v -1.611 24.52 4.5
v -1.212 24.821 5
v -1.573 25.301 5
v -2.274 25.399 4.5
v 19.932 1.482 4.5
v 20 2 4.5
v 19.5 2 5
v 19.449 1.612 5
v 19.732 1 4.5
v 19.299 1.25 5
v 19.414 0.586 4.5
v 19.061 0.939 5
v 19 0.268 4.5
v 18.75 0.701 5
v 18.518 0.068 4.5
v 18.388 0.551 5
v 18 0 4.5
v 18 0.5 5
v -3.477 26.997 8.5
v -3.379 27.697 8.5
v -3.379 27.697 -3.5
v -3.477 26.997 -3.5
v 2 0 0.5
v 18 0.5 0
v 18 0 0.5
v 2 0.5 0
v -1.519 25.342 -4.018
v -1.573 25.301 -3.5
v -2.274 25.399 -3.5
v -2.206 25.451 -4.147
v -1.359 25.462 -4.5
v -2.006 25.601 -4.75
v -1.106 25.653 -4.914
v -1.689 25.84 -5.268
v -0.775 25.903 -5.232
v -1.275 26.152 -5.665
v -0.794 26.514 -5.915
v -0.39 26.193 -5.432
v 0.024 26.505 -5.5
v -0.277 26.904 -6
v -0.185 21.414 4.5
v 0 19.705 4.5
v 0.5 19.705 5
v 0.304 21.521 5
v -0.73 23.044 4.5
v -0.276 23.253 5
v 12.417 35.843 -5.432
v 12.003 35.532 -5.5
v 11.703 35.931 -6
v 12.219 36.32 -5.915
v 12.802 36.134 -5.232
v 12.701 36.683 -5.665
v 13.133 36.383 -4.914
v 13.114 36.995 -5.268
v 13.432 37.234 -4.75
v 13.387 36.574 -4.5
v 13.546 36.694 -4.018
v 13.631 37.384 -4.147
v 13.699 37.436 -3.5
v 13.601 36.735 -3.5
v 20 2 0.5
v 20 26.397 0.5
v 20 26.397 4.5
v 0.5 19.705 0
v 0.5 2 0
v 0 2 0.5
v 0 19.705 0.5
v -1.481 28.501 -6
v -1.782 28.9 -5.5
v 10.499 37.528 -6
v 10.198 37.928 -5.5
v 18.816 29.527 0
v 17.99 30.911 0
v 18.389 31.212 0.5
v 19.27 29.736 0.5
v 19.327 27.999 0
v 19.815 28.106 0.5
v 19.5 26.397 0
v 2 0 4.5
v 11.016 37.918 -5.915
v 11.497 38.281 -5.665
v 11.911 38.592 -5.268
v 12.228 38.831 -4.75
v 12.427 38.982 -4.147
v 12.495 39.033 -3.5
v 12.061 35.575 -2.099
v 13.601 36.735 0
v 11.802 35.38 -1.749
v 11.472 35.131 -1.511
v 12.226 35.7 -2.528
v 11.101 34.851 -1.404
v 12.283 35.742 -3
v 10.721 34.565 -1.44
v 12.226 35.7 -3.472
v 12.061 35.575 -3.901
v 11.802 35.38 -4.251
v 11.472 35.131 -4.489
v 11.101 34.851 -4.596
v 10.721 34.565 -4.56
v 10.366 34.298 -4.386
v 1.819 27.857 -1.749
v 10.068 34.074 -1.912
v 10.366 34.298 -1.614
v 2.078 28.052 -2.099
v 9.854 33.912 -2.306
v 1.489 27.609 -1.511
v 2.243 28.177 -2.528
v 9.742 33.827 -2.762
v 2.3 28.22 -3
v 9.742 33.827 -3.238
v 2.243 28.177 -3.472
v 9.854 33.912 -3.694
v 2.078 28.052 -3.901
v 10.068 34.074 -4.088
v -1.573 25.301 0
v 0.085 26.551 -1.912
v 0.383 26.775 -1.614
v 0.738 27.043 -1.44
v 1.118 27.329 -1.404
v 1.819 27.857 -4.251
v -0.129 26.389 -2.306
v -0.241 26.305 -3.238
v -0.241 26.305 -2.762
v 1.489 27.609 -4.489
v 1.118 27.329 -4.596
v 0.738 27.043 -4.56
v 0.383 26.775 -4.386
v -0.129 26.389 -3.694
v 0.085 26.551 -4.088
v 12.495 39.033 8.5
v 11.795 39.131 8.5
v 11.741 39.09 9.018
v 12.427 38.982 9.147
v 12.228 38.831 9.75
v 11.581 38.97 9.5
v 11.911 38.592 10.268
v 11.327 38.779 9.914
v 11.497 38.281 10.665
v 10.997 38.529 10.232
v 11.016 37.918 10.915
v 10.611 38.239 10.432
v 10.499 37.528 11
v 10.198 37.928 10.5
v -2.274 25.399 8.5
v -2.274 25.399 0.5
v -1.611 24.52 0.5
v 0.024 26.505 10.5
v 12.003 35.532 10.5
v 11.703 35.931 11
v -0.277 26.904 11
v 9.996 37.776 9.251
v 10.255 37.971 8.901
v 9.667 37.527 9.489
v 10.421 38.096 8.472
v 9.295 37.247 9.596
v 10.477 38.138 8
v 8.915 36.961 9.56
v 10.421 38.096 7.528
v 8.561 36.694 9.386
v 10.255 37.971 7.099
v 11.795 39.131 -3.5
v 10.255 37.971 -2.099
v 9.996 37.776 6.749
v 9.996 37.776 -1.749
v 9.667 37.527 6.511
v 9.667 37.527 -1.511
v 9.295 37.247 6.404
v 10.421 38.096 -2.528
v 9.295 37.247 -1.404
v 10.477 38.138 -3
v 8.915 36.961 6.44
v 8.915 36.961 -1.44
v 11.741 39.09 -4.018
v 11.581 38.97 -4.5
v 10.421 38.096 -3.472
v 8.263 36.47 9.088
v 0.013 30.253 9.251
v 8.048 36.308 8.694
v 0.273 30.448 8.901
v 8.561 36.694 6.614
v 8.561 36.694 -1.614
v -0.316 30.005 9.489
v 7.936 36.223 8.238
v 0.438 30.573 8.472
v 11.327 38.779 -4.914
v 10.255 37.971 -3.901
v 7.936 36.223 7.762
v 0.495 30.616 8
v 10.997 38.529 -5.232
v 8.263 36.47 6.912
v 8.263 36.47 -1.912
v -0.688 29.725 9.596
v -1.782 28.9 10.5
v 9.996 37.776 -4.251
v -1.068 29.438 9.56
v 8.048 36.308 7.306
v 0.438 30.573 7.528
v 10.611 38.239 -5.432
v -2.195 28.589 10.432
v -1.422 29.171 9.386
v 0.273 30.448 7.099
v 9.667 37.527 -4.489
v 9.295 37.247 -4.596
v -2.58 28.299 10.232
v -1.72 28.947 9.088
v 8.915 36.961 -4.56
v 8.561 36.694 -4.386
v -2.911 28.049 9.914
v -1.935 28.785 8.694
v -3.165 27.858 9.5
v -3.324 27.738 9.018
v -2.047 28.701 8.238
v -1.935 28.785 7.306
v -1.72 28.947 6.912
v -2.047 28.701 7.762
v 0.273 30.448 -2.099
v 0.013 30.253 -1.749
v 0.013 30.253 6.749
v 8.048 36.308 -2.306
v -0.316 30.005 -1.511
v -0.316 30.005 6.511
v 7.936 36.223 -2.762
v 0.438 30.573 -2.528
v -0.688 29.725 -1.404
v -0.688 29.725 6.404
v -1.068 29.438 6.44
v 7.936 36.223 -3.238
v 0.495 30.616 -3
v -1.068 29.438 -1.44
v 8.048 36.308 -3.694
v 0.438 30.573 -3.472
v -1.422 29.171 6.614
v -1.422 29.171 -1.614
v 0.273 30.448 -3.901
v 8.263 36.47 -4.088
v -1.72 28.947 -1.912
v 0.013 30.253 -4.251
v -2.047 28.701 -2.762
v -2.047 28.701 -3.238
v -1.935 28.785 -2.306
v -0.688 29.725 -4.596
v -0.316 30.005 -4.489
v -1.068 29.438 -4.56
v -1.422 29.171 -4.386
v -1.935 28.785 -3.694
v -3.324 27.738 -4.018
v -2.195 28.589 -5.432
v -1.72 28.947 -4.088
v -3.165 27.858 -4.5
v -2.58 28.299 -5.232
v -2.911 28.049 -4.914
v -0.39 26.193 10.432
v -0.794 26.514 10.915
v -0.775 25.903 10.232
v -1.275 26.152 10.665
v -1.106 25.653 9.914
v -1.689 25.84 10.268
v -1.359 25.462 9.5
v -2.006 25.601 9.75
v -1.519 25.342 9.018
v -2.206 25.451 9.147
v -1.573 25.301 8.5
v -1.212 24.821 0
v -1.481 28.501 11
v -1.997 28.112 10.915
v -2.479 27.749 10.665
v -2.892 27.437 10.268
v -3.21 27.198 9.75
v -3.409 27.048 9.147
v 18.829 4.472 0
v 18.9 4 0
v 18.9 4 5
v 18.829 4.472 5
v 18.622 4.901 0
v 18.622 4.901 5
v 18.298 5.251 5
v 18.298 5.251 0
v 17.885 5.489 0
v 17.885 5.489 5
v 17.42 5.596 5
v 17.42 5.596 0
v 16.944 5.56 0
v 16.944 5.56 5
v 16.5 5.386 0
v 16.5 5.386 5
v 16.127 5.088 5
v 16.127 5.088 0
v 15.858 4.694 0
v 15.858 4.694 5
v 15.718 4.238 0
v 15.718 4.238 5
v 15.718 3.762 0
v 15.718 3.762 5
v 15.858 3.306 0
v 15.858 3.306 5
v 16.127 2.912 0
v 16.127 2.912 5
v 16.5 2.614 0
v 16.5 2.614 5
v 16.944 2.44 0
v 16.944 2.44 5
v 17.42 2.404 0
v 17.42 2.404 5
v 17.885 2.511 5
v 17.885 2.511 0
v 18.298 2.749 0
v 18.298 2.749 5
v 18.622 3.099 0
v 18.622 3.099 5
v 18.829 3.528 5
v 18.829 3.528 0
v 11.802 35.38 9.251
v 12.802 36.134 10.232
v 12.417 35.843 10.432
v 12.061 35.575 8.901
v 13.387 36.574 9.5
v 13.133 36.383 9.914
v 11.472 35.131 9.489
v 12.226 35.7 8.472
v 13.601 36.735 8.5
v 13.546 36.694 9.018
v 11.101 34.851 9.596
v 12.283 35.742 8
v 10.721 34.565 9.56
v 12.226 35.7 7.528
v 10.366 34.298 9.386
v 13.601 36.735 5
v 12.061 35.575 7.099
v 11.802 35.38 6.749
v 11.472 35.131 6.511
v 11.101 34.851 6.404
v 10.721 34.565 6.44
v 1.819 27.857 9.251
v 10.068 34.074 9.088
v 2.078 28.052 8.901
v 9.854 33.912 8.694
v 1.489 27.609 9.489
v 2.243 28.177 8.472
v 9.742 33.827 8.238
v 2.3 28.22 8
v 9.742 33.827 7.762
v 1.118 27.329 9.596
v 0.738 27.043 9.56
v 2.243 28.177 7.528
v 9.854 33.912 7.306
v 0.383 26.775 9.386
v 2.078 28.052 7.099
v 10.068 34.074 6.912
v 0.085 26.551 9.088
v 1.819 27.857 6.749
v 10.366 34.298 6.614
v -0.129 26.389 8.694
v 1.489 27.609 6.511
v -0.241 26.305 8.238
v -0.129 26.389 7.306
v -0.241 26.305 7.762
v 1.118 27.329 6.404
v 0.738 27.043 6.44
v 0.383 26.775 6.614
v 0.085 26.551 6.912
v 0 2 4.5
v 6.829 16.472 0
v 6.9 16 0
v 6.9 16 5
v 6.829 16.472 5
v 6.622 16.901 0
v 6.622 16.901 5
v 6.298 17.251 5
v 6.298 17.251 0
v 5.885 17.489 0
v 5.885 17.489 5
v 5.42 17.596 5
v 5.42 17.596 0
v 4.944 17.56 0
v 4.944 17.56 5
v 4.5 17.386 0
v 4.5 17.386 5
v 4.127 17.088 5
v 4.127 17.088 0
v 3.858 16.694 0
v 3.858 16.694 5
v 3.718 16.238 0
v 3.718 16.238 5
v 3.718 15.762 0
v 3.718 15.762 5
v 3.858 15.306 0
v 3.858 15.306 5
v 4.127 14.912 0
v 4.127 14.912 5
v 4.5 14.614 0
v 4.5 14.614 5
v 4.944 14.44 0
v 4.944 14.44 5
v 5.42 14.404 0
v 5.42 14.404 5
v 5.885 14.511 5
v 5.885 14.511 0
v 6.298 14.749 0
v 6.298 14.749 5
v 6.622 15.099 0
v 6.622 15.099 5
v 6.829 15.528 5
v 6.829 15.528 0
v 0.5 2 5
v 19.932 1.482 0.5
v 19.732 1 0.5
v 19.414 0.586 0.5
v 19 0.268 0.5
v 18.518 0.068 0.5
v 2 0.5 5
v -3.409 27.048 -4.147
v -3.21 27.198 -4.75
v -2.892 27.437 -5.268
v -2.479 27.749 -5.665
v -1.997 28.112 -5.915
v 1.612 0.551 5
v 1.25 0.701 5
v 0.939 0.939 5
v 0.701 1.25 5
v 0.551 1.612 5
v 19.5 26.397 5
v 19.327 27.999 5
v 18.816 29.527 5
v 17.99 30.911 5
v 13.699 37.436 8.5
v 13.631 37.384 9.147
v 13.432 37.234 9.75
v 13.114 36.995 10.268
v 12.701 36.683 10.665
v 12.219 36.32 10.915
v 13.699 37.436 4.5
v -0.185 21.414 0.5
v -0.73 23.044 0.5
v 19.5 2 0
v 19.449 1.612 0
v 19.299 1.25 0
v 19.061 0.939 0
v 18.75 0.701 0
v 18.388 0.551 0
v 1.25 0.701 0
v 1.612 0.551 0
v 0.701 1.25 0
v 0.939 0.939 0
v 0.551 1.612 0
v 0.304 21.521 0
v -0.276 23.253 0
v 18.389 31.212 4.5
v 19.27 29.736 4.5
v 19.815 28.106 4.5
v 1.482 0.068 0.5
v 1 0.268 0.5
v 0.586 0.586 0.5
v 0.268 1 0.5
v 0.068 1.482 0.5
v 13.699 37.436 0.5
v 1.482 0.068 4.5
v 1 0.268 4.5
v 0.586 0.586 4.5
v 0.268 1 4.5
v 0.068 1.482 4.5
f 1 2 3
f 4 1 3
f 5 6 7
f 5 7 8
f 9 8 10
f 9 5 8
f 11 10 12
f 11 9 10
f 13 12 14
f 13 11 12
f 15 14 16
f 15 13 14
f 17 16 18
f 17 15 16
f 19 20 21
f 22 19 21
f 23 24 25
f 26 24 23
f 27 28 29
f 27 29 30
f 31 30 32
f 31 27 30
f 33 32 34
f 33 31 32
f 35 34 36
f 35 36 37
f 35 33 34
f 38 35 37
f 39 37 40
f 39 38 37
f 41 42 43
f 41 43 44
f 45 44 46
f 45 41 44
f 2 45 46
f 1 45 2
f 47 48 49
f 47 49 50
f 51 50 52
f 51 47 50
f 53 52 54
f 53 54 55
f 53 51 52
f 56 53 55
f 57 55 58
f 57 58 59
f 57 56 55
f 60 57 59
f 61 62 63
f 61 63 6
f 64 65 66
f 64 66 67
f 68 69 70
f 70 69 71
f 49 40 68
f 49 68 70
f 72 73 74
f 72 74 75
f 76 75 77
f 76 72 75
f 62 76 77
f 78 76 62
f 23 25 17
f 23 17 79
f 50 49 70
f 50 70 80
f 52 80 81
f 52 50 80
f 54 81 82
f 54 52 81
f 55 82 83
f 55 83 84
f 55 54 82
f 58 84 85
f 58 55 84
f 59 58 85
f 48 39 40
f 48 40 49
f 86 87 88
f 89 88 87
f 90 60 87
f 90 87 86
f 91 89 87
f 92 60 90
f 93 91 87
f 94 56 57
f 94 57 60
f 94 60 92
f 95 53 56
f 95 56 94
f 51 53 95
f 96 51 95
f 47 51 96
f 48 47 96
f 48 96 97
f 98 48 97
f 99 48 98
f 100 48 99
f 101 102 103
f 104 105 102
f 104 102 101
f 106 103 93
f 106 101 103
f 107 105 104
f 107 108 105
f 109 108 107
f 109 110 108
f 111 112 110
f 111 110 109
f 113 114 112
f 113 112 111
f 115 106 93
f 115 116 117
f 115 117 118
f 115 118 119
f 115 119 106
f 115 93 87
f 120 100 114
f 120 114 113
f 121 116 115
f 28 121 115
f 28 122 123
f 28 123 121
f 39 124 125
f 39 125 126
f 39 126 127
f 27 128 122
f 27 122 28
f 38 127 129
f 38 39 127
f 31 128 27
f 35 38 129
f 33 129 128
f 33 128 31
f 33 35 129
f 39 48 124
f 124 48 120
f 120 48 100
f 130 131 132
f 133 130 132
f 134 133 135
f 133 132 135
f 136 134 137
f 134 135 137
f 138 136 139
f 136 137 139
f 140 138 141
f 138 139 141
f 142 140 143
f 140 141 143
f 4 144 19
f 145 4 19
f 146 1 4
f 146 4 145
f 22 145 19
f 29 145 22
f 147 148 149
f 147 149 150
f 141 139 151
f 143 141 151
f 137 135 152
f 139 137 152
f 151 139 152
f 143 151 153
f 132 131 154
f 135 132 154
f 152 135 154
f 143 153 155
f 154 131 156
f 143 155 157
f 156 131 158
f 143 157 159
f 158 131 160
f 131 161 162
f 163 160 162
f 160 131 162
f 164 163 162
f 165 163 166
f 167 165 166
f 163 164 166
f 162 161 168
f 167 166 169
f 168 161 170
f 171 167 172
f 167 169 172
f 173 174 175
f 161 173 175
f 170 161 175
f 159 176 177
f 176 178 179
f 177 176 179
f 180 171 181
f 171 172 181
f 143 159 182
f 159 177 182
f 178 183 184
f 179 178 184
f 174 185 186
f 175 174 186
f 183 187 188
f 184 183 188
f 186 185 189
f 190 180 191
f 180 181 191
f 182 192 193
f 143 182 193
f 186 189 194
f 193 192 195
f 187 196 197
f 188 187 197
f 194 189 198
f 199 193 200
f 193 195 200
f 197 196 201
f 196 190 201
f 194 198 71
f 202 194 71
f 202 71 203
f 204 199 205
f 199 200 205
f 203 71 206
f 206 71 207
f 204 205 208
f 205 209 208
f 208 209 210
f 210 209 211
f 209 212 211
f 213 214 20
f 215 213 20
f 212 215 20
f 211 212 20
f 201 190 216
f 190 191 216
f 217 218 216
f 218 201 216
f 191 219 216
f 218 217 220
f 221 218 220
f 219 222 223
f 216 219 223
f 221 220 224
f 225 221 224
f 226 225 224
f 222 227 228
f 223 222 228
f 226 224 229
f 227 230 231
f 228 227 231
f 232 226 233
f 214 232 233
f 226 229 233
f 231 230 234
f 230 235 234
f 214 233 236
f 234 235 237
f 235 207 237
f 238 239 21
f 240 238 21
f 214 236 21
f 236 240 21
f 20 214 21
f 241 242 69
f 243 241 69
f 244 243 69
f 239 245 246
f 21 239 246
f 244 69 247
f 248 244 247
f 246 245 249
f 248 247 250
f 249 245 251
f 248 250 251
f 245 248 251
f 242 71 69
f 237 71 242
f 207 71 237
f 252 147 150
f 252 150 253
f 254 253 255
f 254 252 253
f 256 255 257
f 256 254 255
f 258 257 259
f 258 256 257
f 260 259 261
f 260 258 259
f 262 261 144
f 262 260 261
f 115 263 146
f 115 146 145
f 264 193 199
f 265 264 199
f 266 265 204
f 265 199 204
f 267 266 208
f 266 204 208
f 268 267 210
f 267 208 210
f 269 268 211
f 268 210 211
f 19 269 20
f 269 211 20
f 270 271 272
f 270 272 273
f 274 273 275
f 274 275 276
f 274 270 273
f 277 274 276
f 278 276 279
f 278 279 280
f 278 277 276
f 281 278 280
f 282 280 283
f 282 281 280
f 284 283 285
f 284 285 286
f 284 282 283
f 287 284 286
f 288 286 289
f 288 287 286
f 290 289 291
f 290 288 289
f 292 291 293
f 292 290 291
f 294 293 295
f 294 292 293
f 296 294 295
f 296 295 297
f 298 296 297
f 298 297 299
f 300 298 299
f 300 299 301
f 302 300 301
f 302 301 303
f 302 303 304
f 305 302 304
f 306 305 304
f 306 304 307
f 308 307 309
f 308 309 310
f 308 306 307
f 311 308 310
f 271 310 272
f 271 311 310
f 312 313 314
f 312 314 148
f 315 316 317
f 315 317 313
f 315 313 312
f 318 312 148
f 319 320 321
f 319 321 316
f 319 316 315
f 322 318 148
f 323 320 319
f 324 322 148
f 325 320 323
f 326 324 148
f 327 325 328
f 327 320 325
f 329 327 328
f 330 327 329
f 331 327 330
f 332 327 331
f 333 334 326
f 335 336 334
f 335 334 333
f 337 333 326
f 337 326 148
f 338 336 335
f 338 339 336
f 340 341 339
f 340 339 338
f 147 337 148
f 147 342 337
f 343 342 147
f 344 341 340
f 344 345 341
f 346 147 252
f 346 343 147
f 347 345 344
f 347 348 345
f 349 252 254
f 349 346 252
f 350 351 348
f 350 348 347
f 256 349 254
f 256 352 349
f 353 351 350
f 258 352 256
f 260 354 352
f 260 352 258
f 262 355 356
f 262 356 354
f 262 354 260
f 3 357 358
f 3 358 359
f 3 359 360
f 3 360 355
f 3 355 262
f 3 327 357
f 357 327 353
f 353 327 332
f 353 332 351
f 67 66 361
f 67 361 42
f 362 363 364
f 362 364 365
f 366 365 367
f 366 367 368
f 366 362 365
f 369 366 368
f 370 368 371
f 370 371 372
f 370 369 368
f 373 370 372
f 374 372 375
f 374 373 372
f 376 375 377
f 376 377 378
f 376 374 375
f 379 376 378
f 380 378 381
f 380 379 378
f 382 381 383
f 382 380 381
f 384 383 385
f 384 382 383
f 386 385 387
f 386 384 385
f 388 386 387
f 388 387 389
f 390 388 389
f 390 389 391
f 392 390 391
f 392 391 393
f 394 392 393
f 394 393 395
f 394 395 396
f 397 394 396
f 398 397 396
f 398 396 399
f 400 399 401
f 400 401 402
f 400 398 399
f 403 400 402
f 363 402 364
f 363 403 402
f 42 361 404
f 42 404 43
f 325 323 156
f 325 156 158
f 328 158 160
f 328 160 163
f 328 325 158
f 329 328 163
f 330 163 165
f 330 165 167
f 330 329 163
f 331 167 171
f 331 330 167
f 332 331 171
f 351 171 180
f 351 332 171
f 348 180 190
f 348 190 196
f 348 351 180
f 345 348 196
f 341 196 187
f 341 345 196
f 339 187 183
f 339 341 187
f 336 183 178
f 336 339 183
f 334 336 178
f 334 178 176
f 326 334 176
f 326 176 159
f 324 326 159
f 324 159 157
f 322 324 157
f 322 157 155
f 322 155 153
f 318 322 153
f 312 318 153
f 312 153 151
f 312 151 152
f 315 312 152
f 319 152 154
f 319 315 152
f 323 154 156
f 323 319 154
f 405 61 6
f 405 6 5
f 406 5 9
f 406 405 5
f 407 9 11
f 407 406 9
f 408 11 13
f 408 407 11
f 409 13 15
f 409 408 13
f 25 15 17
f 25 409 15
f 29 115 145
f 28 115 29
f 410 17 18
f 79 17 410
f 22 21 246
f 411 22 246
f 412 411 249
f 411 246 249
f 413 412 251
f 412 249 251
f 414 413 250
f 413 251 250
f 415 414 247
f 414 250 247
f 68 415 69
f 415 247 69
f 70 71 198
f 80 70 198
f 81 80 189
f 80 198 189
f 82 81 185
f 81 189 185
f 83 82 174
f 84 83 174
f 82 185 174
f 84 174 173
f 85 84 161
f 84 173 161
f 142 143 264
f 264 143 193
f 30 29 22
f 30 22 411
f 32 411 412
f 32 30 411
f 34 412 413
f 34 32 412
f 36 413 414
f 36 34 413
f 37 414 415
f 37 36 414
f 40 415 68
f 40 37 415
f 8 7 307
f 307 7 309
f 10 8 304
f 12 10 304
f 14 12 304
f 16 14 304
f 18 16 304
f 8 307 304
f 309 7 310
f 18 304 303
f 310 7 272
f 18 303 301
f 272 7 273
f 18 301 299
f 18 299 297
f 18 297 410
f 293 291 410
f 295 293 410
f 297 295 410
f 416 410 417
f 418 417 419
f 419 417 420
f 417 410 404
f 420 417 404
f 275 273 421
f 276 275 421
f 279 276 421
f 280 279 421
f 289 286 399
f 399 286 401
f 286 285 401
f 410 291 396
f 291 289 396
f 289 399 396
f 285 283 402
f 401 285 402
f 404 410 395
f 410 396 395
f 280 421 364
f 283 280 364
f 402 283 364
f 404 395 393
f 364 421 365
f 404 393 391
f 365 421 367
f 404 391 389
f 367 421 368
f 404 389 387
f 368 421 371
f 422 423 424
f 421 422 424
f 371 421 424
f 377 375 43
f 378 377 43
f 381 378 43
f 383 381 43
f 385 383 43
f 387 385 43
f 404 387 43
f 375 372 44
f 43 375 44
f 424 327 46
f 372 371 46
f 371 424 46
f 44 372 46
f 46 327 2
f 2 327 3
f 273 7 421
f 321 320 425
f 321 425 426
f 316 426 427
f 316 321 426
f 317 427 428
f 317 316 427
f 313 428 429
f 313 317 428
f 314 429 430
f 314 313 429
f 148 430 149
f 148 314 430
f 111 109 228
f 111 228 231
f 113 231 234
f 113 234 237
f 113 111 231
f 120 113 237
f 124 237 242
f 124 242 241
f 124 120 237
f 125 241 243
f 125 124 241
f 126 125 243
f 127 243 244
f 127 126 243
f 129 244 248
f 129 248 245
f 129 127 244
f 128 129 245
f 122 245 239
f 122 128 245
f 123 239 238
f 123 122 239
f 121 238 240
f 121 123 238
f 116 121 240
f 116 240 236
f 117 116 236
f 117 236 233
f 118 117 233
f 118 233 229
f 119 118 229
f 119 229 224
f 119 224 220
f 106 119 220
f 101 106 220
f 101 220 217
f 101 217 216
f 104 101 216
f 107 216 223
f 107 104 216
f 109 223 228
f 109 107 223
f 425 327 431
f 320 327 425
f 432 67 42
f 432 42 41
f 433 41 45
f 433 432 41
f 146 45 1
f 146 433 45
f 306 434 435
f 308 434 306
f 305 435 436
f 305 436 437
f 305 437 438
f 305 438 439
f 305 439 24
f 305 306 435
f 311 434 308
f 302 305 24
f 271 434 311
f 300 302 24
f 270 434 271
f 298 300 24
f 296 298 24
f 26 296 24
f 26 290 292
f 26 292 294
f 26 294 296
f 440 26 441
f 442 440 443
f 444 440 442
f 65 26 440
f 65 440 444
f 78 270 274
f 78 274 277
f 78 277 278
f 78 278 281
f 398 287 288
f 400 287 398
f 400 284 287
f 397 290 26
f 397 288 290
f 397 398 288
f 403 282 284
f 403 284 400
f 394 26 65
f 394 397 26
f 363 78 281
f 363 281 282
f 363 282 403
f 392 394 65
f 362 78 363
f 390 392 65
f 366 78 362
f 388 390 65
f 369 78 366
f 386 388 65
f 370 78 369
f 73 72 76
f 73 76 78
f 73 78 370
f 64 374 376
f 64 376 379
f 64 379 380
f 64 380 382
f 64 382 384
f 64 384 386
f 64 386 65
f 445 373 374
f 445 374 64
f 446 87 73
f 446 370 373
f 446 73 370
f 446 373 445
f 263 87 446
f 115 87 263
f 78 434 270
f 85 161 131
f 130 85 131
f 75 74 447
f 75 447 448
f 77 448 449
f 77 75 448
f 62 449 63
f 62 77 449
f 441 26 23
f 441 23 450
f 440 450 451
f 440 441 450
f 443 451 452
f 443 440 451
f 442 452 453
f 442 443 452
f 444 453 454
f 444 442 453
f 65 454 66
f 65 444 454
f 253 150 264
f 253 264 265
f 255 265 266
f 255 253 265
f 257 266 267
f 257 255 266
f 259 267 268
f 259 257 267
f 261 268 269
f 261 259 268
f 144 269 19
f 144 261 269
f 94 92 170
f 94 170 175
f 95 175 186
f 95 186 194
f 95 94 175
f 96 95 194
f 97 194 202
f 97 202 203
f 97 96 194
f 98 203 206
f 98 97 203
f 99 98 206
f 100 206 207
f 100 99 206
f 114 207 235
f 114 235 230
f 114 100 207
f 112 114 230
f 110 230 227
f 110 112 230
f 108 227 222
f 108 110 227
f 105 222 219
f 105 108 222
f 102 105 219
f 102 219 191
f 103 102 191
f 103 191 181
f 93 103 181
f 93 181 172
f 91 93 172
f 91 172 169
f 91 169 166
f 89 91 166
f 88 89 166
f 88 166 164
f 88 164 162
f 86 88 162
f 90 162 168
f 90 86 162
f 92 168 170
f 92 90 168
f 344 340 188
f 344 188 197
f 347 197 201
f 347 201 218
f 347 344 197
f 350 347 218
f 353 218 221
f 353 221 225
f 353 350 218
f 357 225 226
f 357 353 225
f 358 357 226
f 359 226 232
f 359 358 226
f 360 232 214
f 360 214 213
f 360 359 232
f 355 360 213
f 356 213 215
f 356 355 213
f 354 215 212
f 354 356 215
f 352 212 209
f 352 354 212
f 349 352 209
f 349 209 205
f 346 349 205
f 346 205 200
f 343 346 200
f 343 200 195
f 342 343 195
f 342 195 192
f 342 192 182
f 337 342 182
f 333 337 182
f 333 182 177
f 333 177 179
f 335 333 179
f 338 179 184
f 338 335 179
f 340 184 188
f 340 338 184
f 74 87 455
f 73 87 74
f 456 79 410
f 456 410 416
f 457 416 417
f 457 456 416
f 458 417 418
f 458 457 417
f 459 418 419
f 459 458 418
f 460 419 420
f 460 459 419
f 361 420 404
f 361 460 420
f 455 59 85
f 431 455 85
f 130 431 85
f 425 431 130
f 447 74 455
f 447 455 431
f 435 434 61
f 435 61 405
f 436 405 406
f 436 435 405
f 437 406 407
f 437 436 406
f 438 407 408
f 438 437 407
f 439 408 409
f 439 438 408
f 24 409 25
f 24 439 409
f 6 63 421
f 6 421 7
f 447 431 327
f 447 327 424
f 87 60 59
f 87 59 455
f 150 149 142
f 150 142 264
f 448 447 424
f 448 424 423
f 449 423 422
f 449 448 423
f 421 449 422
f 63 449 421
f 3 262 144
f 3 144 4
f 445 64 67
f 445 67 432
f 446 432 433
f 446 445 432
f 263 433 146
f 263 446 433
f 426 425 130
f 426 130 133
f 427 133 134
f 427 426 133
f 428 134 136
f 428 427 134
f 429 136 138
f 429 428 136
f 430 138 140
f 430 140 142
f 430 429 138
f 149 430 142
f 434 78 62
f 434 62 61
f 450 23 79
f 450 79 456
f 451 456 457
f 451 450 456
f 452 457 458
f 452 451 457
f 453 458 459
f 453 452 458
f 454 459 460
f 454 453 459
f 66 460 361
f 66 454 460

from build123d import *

# Parameters (mm, degrees)
SKETCH_1_R      = 1.6
SKETCH_1_R_2    = 1.6000000000000019
EXTRUDE_1_DEPTH = 5
SKETCH_2_R      = 1.6000000000000016
SKETCH_2_R_2    = 1.6000000000000125
SKETCH_2_R_3    = 1.6000000000000019
EXTRUDE_2_DEPTH = 3
CHAMFER_1_SIZE  = 0.5


with BuildPart() as part:
    # 草图1 → 凸台-拉伸1 (new body)
    with BuildSketch(Plane.XY):
        with BuildLine():
            Line((0, 2.000000000000014), (0, 19.705362587260357))
            ThreePointArc((0, 19.705362587260357), (-0.4134107583503983, 22.243799838501072), (-1.610915919621628, 24.519882772476706))
            Line((-1.610915919621628, 24.519882772476706), (-1.9727102009459283, 25))
            Line((-1.9727102009459283, 25), (13.999999999999998, 37.036300463040874))
            Line((13.999999999999998, 37.036300463040874), (18.389084080378368, 31.211789162518105))
            ThreePointArc((18.389084080378368, 31.211789162518105), (19.586589241649598, 28.93570622854247), (19.999999999999993, 26.397268977301756))
            Line((19.999999999999993, 26.397268977301756), (20, 2.0000000000000147))
            ThreePointArc((20, 2.0000000000000147), (19.414213562373096, 0.5857864376269051), (17.999999999999986, 0))
            Line((17.999999999999986, 0), (2.000000000000014, 0))
            ThreePointArc((2.000000000000014, 0), (0.5857864376269044, 0.5857864376269049), (0, 2.000000000000014))
        make_face()
        with Locations((5.299999999999996, 16)):
            Circle(SKETCH_1_R, mode=Mode.SUBTRACT)
        with Locations((17.3, 3.999999999999999)):
            Circle(SKETCH_1_R_2, mode=Mode.SUBTRACT)
    extrude(amount=EXTRUDE_1_DEPTH)

    # 草图2 → 凸台-拉伸2 (add)
    with BuildSketch(Plane(origin=(-12.730249987910918, 16.89361232439068, 0), x_dir=(0.7986355100472964, 0.6018150231520436, 0), z_dir=(-0.6018150231520436, 0.7986355100472964, 0))):
        with BuildLine():
            Line((30.96989916129314, -11.000000000000002), (15.969899161293144, -11.000000000000002))
            ThreePointArc((15.969899161293144, -11.000000000000002), (14.202132208326773, -10.267766952966369), (13.469899161293144, -8.499999999999998))
            Line((13.469899161293144, -8.499999999999998), (13.469899161293144, 3.500000000000003))
            ThreePointArc((13.469899161293144, 3.500000000000003), (14.202132208326775, 5.267766952966372), (15.969899161293144, 6.000000000000004))
            Line((15.969899161293144, 6.000000000000004), (30.96989916129314, 6.000000000000004))
            ThreePointArc((30.96989916129314, 6.000000000000004), (32.737666114259504, 5.26776695296637), (33.469899161293135, 3.5000000000000036))
            Line((33.469899161293135, 3.5000000000000036), (33.469899161293135, -8.499999999999998))
            ThreePointArc((33.469899161293135, -8.499999999999998), (32.73766611425951, -10.267766952966369), (30.96989916129314, -11.000000000000002))
        make_face()
        with Locations((17.21989916129313, 3.0000000000000004)):
            Circle(SKETCH_2_R, mode=Mode.SUBTRACT)
        with Locations((29.71989916129313, 3.0000000000000018)):
            Circle(SKETCH_2_R_2, mode=Mode.SUBTRACT)
        with Locations((29.71989916129313, -7.999999999999998)):
            Circle(SKETCH_2_R_2, mode=Mode.SUBTRACT)
        with Locations((17.21989916129313, -8)):
            Circle(SKETCH_2_R_3, mode=Mode.SUBTRACT)
    extrude(amount=EXTRUDE_2_DEPTH)

    # 倒角1
    chamfer_1_edges = [part.edges().sort_by_distance(p)[0] for p in [
        (-0.4134107583503974, 22.243799838501072, 5),
        (19.999999999999996, 14.198634488650885, 0),
        (19.414213562373096, 0.5857864376269046, 0),
        (10, 0, 0),
        (0.5857864376269049, 0.5857864376269046, 0),
        (0, 10.852681293630186, 0),
        (-0.4134107583503974, 22.243799838501072, 0),
        (-1.7918130602837783, 24.759941386238353, 0),
        (0, 10.852681293630186, 5),
        (0.5857864376269049, 0.5857864376269046, 5),
        (10, 0, 5),
        (19.414213562373096, 0.5857864376269046, 5),
        (19.999999999999996, 14.198634488650885, 5),
        (19.586589241649598, 28.93570622854247, 5),
        (16.194542040189184, 34.12404481277949, 5),
        (-3.19336795741086, 27.83657537829513, 10.267766952966369),
        (4.208199830070912, 33.41405676166233, 11.000000000000002),
        (11.609767617552686, 38.99153814502953, 10.26776695296637),
        (12.194554930543871, 39.43220699318276, 2.4999999999999973),
        (11.609767617552682, 38.99153814502952, -5.26776695296637),
        (4.208199830070912, 33.41405676166233, -6.000000000000004),
        (-3.1933679574108584, 27.83657537829513, -5.267766952966372),
        (-3.778155270402049, 27.395906530141897, 2.4999999999999973),
        (-1.3879228879547298, 25.440668848153244, 10.267766952966369),
        (6.013644899527042, 31.018150231520444, 11.000000000000002),
        (13.415212687008816, 36.59563161488764, 10.26776695296637),
        (14.000000000000002, 37.036300463040874, 6.75),
        (14.000000000000002, 37.036300463040874, -1.7500000000000018),
        (13.415212687008813, 36.59563161488764, -5.26776695296637),
        (6.013644899527042, 31.018150231520444, -6.000000000000004),
        (-1.387922887954728, 25.440668848153244, -5.267766952966372),
        (-1.9727102009459188, 25.000000000000007, -1.7500000000000018),
        (-1.9727102009459188, 25.000000000000007, 6.749999999999999),
        (-1.7918130602837783, 24.759941386238353, 5),
        (16.194542040189184, 34.12404481277949, 0),
        (19.586589241649598, 28.93570622854247, 0),
    ]]
    chamfer(chamfer_1_edges, length=CHAMFER_1_SIZE)


solid = part.part
